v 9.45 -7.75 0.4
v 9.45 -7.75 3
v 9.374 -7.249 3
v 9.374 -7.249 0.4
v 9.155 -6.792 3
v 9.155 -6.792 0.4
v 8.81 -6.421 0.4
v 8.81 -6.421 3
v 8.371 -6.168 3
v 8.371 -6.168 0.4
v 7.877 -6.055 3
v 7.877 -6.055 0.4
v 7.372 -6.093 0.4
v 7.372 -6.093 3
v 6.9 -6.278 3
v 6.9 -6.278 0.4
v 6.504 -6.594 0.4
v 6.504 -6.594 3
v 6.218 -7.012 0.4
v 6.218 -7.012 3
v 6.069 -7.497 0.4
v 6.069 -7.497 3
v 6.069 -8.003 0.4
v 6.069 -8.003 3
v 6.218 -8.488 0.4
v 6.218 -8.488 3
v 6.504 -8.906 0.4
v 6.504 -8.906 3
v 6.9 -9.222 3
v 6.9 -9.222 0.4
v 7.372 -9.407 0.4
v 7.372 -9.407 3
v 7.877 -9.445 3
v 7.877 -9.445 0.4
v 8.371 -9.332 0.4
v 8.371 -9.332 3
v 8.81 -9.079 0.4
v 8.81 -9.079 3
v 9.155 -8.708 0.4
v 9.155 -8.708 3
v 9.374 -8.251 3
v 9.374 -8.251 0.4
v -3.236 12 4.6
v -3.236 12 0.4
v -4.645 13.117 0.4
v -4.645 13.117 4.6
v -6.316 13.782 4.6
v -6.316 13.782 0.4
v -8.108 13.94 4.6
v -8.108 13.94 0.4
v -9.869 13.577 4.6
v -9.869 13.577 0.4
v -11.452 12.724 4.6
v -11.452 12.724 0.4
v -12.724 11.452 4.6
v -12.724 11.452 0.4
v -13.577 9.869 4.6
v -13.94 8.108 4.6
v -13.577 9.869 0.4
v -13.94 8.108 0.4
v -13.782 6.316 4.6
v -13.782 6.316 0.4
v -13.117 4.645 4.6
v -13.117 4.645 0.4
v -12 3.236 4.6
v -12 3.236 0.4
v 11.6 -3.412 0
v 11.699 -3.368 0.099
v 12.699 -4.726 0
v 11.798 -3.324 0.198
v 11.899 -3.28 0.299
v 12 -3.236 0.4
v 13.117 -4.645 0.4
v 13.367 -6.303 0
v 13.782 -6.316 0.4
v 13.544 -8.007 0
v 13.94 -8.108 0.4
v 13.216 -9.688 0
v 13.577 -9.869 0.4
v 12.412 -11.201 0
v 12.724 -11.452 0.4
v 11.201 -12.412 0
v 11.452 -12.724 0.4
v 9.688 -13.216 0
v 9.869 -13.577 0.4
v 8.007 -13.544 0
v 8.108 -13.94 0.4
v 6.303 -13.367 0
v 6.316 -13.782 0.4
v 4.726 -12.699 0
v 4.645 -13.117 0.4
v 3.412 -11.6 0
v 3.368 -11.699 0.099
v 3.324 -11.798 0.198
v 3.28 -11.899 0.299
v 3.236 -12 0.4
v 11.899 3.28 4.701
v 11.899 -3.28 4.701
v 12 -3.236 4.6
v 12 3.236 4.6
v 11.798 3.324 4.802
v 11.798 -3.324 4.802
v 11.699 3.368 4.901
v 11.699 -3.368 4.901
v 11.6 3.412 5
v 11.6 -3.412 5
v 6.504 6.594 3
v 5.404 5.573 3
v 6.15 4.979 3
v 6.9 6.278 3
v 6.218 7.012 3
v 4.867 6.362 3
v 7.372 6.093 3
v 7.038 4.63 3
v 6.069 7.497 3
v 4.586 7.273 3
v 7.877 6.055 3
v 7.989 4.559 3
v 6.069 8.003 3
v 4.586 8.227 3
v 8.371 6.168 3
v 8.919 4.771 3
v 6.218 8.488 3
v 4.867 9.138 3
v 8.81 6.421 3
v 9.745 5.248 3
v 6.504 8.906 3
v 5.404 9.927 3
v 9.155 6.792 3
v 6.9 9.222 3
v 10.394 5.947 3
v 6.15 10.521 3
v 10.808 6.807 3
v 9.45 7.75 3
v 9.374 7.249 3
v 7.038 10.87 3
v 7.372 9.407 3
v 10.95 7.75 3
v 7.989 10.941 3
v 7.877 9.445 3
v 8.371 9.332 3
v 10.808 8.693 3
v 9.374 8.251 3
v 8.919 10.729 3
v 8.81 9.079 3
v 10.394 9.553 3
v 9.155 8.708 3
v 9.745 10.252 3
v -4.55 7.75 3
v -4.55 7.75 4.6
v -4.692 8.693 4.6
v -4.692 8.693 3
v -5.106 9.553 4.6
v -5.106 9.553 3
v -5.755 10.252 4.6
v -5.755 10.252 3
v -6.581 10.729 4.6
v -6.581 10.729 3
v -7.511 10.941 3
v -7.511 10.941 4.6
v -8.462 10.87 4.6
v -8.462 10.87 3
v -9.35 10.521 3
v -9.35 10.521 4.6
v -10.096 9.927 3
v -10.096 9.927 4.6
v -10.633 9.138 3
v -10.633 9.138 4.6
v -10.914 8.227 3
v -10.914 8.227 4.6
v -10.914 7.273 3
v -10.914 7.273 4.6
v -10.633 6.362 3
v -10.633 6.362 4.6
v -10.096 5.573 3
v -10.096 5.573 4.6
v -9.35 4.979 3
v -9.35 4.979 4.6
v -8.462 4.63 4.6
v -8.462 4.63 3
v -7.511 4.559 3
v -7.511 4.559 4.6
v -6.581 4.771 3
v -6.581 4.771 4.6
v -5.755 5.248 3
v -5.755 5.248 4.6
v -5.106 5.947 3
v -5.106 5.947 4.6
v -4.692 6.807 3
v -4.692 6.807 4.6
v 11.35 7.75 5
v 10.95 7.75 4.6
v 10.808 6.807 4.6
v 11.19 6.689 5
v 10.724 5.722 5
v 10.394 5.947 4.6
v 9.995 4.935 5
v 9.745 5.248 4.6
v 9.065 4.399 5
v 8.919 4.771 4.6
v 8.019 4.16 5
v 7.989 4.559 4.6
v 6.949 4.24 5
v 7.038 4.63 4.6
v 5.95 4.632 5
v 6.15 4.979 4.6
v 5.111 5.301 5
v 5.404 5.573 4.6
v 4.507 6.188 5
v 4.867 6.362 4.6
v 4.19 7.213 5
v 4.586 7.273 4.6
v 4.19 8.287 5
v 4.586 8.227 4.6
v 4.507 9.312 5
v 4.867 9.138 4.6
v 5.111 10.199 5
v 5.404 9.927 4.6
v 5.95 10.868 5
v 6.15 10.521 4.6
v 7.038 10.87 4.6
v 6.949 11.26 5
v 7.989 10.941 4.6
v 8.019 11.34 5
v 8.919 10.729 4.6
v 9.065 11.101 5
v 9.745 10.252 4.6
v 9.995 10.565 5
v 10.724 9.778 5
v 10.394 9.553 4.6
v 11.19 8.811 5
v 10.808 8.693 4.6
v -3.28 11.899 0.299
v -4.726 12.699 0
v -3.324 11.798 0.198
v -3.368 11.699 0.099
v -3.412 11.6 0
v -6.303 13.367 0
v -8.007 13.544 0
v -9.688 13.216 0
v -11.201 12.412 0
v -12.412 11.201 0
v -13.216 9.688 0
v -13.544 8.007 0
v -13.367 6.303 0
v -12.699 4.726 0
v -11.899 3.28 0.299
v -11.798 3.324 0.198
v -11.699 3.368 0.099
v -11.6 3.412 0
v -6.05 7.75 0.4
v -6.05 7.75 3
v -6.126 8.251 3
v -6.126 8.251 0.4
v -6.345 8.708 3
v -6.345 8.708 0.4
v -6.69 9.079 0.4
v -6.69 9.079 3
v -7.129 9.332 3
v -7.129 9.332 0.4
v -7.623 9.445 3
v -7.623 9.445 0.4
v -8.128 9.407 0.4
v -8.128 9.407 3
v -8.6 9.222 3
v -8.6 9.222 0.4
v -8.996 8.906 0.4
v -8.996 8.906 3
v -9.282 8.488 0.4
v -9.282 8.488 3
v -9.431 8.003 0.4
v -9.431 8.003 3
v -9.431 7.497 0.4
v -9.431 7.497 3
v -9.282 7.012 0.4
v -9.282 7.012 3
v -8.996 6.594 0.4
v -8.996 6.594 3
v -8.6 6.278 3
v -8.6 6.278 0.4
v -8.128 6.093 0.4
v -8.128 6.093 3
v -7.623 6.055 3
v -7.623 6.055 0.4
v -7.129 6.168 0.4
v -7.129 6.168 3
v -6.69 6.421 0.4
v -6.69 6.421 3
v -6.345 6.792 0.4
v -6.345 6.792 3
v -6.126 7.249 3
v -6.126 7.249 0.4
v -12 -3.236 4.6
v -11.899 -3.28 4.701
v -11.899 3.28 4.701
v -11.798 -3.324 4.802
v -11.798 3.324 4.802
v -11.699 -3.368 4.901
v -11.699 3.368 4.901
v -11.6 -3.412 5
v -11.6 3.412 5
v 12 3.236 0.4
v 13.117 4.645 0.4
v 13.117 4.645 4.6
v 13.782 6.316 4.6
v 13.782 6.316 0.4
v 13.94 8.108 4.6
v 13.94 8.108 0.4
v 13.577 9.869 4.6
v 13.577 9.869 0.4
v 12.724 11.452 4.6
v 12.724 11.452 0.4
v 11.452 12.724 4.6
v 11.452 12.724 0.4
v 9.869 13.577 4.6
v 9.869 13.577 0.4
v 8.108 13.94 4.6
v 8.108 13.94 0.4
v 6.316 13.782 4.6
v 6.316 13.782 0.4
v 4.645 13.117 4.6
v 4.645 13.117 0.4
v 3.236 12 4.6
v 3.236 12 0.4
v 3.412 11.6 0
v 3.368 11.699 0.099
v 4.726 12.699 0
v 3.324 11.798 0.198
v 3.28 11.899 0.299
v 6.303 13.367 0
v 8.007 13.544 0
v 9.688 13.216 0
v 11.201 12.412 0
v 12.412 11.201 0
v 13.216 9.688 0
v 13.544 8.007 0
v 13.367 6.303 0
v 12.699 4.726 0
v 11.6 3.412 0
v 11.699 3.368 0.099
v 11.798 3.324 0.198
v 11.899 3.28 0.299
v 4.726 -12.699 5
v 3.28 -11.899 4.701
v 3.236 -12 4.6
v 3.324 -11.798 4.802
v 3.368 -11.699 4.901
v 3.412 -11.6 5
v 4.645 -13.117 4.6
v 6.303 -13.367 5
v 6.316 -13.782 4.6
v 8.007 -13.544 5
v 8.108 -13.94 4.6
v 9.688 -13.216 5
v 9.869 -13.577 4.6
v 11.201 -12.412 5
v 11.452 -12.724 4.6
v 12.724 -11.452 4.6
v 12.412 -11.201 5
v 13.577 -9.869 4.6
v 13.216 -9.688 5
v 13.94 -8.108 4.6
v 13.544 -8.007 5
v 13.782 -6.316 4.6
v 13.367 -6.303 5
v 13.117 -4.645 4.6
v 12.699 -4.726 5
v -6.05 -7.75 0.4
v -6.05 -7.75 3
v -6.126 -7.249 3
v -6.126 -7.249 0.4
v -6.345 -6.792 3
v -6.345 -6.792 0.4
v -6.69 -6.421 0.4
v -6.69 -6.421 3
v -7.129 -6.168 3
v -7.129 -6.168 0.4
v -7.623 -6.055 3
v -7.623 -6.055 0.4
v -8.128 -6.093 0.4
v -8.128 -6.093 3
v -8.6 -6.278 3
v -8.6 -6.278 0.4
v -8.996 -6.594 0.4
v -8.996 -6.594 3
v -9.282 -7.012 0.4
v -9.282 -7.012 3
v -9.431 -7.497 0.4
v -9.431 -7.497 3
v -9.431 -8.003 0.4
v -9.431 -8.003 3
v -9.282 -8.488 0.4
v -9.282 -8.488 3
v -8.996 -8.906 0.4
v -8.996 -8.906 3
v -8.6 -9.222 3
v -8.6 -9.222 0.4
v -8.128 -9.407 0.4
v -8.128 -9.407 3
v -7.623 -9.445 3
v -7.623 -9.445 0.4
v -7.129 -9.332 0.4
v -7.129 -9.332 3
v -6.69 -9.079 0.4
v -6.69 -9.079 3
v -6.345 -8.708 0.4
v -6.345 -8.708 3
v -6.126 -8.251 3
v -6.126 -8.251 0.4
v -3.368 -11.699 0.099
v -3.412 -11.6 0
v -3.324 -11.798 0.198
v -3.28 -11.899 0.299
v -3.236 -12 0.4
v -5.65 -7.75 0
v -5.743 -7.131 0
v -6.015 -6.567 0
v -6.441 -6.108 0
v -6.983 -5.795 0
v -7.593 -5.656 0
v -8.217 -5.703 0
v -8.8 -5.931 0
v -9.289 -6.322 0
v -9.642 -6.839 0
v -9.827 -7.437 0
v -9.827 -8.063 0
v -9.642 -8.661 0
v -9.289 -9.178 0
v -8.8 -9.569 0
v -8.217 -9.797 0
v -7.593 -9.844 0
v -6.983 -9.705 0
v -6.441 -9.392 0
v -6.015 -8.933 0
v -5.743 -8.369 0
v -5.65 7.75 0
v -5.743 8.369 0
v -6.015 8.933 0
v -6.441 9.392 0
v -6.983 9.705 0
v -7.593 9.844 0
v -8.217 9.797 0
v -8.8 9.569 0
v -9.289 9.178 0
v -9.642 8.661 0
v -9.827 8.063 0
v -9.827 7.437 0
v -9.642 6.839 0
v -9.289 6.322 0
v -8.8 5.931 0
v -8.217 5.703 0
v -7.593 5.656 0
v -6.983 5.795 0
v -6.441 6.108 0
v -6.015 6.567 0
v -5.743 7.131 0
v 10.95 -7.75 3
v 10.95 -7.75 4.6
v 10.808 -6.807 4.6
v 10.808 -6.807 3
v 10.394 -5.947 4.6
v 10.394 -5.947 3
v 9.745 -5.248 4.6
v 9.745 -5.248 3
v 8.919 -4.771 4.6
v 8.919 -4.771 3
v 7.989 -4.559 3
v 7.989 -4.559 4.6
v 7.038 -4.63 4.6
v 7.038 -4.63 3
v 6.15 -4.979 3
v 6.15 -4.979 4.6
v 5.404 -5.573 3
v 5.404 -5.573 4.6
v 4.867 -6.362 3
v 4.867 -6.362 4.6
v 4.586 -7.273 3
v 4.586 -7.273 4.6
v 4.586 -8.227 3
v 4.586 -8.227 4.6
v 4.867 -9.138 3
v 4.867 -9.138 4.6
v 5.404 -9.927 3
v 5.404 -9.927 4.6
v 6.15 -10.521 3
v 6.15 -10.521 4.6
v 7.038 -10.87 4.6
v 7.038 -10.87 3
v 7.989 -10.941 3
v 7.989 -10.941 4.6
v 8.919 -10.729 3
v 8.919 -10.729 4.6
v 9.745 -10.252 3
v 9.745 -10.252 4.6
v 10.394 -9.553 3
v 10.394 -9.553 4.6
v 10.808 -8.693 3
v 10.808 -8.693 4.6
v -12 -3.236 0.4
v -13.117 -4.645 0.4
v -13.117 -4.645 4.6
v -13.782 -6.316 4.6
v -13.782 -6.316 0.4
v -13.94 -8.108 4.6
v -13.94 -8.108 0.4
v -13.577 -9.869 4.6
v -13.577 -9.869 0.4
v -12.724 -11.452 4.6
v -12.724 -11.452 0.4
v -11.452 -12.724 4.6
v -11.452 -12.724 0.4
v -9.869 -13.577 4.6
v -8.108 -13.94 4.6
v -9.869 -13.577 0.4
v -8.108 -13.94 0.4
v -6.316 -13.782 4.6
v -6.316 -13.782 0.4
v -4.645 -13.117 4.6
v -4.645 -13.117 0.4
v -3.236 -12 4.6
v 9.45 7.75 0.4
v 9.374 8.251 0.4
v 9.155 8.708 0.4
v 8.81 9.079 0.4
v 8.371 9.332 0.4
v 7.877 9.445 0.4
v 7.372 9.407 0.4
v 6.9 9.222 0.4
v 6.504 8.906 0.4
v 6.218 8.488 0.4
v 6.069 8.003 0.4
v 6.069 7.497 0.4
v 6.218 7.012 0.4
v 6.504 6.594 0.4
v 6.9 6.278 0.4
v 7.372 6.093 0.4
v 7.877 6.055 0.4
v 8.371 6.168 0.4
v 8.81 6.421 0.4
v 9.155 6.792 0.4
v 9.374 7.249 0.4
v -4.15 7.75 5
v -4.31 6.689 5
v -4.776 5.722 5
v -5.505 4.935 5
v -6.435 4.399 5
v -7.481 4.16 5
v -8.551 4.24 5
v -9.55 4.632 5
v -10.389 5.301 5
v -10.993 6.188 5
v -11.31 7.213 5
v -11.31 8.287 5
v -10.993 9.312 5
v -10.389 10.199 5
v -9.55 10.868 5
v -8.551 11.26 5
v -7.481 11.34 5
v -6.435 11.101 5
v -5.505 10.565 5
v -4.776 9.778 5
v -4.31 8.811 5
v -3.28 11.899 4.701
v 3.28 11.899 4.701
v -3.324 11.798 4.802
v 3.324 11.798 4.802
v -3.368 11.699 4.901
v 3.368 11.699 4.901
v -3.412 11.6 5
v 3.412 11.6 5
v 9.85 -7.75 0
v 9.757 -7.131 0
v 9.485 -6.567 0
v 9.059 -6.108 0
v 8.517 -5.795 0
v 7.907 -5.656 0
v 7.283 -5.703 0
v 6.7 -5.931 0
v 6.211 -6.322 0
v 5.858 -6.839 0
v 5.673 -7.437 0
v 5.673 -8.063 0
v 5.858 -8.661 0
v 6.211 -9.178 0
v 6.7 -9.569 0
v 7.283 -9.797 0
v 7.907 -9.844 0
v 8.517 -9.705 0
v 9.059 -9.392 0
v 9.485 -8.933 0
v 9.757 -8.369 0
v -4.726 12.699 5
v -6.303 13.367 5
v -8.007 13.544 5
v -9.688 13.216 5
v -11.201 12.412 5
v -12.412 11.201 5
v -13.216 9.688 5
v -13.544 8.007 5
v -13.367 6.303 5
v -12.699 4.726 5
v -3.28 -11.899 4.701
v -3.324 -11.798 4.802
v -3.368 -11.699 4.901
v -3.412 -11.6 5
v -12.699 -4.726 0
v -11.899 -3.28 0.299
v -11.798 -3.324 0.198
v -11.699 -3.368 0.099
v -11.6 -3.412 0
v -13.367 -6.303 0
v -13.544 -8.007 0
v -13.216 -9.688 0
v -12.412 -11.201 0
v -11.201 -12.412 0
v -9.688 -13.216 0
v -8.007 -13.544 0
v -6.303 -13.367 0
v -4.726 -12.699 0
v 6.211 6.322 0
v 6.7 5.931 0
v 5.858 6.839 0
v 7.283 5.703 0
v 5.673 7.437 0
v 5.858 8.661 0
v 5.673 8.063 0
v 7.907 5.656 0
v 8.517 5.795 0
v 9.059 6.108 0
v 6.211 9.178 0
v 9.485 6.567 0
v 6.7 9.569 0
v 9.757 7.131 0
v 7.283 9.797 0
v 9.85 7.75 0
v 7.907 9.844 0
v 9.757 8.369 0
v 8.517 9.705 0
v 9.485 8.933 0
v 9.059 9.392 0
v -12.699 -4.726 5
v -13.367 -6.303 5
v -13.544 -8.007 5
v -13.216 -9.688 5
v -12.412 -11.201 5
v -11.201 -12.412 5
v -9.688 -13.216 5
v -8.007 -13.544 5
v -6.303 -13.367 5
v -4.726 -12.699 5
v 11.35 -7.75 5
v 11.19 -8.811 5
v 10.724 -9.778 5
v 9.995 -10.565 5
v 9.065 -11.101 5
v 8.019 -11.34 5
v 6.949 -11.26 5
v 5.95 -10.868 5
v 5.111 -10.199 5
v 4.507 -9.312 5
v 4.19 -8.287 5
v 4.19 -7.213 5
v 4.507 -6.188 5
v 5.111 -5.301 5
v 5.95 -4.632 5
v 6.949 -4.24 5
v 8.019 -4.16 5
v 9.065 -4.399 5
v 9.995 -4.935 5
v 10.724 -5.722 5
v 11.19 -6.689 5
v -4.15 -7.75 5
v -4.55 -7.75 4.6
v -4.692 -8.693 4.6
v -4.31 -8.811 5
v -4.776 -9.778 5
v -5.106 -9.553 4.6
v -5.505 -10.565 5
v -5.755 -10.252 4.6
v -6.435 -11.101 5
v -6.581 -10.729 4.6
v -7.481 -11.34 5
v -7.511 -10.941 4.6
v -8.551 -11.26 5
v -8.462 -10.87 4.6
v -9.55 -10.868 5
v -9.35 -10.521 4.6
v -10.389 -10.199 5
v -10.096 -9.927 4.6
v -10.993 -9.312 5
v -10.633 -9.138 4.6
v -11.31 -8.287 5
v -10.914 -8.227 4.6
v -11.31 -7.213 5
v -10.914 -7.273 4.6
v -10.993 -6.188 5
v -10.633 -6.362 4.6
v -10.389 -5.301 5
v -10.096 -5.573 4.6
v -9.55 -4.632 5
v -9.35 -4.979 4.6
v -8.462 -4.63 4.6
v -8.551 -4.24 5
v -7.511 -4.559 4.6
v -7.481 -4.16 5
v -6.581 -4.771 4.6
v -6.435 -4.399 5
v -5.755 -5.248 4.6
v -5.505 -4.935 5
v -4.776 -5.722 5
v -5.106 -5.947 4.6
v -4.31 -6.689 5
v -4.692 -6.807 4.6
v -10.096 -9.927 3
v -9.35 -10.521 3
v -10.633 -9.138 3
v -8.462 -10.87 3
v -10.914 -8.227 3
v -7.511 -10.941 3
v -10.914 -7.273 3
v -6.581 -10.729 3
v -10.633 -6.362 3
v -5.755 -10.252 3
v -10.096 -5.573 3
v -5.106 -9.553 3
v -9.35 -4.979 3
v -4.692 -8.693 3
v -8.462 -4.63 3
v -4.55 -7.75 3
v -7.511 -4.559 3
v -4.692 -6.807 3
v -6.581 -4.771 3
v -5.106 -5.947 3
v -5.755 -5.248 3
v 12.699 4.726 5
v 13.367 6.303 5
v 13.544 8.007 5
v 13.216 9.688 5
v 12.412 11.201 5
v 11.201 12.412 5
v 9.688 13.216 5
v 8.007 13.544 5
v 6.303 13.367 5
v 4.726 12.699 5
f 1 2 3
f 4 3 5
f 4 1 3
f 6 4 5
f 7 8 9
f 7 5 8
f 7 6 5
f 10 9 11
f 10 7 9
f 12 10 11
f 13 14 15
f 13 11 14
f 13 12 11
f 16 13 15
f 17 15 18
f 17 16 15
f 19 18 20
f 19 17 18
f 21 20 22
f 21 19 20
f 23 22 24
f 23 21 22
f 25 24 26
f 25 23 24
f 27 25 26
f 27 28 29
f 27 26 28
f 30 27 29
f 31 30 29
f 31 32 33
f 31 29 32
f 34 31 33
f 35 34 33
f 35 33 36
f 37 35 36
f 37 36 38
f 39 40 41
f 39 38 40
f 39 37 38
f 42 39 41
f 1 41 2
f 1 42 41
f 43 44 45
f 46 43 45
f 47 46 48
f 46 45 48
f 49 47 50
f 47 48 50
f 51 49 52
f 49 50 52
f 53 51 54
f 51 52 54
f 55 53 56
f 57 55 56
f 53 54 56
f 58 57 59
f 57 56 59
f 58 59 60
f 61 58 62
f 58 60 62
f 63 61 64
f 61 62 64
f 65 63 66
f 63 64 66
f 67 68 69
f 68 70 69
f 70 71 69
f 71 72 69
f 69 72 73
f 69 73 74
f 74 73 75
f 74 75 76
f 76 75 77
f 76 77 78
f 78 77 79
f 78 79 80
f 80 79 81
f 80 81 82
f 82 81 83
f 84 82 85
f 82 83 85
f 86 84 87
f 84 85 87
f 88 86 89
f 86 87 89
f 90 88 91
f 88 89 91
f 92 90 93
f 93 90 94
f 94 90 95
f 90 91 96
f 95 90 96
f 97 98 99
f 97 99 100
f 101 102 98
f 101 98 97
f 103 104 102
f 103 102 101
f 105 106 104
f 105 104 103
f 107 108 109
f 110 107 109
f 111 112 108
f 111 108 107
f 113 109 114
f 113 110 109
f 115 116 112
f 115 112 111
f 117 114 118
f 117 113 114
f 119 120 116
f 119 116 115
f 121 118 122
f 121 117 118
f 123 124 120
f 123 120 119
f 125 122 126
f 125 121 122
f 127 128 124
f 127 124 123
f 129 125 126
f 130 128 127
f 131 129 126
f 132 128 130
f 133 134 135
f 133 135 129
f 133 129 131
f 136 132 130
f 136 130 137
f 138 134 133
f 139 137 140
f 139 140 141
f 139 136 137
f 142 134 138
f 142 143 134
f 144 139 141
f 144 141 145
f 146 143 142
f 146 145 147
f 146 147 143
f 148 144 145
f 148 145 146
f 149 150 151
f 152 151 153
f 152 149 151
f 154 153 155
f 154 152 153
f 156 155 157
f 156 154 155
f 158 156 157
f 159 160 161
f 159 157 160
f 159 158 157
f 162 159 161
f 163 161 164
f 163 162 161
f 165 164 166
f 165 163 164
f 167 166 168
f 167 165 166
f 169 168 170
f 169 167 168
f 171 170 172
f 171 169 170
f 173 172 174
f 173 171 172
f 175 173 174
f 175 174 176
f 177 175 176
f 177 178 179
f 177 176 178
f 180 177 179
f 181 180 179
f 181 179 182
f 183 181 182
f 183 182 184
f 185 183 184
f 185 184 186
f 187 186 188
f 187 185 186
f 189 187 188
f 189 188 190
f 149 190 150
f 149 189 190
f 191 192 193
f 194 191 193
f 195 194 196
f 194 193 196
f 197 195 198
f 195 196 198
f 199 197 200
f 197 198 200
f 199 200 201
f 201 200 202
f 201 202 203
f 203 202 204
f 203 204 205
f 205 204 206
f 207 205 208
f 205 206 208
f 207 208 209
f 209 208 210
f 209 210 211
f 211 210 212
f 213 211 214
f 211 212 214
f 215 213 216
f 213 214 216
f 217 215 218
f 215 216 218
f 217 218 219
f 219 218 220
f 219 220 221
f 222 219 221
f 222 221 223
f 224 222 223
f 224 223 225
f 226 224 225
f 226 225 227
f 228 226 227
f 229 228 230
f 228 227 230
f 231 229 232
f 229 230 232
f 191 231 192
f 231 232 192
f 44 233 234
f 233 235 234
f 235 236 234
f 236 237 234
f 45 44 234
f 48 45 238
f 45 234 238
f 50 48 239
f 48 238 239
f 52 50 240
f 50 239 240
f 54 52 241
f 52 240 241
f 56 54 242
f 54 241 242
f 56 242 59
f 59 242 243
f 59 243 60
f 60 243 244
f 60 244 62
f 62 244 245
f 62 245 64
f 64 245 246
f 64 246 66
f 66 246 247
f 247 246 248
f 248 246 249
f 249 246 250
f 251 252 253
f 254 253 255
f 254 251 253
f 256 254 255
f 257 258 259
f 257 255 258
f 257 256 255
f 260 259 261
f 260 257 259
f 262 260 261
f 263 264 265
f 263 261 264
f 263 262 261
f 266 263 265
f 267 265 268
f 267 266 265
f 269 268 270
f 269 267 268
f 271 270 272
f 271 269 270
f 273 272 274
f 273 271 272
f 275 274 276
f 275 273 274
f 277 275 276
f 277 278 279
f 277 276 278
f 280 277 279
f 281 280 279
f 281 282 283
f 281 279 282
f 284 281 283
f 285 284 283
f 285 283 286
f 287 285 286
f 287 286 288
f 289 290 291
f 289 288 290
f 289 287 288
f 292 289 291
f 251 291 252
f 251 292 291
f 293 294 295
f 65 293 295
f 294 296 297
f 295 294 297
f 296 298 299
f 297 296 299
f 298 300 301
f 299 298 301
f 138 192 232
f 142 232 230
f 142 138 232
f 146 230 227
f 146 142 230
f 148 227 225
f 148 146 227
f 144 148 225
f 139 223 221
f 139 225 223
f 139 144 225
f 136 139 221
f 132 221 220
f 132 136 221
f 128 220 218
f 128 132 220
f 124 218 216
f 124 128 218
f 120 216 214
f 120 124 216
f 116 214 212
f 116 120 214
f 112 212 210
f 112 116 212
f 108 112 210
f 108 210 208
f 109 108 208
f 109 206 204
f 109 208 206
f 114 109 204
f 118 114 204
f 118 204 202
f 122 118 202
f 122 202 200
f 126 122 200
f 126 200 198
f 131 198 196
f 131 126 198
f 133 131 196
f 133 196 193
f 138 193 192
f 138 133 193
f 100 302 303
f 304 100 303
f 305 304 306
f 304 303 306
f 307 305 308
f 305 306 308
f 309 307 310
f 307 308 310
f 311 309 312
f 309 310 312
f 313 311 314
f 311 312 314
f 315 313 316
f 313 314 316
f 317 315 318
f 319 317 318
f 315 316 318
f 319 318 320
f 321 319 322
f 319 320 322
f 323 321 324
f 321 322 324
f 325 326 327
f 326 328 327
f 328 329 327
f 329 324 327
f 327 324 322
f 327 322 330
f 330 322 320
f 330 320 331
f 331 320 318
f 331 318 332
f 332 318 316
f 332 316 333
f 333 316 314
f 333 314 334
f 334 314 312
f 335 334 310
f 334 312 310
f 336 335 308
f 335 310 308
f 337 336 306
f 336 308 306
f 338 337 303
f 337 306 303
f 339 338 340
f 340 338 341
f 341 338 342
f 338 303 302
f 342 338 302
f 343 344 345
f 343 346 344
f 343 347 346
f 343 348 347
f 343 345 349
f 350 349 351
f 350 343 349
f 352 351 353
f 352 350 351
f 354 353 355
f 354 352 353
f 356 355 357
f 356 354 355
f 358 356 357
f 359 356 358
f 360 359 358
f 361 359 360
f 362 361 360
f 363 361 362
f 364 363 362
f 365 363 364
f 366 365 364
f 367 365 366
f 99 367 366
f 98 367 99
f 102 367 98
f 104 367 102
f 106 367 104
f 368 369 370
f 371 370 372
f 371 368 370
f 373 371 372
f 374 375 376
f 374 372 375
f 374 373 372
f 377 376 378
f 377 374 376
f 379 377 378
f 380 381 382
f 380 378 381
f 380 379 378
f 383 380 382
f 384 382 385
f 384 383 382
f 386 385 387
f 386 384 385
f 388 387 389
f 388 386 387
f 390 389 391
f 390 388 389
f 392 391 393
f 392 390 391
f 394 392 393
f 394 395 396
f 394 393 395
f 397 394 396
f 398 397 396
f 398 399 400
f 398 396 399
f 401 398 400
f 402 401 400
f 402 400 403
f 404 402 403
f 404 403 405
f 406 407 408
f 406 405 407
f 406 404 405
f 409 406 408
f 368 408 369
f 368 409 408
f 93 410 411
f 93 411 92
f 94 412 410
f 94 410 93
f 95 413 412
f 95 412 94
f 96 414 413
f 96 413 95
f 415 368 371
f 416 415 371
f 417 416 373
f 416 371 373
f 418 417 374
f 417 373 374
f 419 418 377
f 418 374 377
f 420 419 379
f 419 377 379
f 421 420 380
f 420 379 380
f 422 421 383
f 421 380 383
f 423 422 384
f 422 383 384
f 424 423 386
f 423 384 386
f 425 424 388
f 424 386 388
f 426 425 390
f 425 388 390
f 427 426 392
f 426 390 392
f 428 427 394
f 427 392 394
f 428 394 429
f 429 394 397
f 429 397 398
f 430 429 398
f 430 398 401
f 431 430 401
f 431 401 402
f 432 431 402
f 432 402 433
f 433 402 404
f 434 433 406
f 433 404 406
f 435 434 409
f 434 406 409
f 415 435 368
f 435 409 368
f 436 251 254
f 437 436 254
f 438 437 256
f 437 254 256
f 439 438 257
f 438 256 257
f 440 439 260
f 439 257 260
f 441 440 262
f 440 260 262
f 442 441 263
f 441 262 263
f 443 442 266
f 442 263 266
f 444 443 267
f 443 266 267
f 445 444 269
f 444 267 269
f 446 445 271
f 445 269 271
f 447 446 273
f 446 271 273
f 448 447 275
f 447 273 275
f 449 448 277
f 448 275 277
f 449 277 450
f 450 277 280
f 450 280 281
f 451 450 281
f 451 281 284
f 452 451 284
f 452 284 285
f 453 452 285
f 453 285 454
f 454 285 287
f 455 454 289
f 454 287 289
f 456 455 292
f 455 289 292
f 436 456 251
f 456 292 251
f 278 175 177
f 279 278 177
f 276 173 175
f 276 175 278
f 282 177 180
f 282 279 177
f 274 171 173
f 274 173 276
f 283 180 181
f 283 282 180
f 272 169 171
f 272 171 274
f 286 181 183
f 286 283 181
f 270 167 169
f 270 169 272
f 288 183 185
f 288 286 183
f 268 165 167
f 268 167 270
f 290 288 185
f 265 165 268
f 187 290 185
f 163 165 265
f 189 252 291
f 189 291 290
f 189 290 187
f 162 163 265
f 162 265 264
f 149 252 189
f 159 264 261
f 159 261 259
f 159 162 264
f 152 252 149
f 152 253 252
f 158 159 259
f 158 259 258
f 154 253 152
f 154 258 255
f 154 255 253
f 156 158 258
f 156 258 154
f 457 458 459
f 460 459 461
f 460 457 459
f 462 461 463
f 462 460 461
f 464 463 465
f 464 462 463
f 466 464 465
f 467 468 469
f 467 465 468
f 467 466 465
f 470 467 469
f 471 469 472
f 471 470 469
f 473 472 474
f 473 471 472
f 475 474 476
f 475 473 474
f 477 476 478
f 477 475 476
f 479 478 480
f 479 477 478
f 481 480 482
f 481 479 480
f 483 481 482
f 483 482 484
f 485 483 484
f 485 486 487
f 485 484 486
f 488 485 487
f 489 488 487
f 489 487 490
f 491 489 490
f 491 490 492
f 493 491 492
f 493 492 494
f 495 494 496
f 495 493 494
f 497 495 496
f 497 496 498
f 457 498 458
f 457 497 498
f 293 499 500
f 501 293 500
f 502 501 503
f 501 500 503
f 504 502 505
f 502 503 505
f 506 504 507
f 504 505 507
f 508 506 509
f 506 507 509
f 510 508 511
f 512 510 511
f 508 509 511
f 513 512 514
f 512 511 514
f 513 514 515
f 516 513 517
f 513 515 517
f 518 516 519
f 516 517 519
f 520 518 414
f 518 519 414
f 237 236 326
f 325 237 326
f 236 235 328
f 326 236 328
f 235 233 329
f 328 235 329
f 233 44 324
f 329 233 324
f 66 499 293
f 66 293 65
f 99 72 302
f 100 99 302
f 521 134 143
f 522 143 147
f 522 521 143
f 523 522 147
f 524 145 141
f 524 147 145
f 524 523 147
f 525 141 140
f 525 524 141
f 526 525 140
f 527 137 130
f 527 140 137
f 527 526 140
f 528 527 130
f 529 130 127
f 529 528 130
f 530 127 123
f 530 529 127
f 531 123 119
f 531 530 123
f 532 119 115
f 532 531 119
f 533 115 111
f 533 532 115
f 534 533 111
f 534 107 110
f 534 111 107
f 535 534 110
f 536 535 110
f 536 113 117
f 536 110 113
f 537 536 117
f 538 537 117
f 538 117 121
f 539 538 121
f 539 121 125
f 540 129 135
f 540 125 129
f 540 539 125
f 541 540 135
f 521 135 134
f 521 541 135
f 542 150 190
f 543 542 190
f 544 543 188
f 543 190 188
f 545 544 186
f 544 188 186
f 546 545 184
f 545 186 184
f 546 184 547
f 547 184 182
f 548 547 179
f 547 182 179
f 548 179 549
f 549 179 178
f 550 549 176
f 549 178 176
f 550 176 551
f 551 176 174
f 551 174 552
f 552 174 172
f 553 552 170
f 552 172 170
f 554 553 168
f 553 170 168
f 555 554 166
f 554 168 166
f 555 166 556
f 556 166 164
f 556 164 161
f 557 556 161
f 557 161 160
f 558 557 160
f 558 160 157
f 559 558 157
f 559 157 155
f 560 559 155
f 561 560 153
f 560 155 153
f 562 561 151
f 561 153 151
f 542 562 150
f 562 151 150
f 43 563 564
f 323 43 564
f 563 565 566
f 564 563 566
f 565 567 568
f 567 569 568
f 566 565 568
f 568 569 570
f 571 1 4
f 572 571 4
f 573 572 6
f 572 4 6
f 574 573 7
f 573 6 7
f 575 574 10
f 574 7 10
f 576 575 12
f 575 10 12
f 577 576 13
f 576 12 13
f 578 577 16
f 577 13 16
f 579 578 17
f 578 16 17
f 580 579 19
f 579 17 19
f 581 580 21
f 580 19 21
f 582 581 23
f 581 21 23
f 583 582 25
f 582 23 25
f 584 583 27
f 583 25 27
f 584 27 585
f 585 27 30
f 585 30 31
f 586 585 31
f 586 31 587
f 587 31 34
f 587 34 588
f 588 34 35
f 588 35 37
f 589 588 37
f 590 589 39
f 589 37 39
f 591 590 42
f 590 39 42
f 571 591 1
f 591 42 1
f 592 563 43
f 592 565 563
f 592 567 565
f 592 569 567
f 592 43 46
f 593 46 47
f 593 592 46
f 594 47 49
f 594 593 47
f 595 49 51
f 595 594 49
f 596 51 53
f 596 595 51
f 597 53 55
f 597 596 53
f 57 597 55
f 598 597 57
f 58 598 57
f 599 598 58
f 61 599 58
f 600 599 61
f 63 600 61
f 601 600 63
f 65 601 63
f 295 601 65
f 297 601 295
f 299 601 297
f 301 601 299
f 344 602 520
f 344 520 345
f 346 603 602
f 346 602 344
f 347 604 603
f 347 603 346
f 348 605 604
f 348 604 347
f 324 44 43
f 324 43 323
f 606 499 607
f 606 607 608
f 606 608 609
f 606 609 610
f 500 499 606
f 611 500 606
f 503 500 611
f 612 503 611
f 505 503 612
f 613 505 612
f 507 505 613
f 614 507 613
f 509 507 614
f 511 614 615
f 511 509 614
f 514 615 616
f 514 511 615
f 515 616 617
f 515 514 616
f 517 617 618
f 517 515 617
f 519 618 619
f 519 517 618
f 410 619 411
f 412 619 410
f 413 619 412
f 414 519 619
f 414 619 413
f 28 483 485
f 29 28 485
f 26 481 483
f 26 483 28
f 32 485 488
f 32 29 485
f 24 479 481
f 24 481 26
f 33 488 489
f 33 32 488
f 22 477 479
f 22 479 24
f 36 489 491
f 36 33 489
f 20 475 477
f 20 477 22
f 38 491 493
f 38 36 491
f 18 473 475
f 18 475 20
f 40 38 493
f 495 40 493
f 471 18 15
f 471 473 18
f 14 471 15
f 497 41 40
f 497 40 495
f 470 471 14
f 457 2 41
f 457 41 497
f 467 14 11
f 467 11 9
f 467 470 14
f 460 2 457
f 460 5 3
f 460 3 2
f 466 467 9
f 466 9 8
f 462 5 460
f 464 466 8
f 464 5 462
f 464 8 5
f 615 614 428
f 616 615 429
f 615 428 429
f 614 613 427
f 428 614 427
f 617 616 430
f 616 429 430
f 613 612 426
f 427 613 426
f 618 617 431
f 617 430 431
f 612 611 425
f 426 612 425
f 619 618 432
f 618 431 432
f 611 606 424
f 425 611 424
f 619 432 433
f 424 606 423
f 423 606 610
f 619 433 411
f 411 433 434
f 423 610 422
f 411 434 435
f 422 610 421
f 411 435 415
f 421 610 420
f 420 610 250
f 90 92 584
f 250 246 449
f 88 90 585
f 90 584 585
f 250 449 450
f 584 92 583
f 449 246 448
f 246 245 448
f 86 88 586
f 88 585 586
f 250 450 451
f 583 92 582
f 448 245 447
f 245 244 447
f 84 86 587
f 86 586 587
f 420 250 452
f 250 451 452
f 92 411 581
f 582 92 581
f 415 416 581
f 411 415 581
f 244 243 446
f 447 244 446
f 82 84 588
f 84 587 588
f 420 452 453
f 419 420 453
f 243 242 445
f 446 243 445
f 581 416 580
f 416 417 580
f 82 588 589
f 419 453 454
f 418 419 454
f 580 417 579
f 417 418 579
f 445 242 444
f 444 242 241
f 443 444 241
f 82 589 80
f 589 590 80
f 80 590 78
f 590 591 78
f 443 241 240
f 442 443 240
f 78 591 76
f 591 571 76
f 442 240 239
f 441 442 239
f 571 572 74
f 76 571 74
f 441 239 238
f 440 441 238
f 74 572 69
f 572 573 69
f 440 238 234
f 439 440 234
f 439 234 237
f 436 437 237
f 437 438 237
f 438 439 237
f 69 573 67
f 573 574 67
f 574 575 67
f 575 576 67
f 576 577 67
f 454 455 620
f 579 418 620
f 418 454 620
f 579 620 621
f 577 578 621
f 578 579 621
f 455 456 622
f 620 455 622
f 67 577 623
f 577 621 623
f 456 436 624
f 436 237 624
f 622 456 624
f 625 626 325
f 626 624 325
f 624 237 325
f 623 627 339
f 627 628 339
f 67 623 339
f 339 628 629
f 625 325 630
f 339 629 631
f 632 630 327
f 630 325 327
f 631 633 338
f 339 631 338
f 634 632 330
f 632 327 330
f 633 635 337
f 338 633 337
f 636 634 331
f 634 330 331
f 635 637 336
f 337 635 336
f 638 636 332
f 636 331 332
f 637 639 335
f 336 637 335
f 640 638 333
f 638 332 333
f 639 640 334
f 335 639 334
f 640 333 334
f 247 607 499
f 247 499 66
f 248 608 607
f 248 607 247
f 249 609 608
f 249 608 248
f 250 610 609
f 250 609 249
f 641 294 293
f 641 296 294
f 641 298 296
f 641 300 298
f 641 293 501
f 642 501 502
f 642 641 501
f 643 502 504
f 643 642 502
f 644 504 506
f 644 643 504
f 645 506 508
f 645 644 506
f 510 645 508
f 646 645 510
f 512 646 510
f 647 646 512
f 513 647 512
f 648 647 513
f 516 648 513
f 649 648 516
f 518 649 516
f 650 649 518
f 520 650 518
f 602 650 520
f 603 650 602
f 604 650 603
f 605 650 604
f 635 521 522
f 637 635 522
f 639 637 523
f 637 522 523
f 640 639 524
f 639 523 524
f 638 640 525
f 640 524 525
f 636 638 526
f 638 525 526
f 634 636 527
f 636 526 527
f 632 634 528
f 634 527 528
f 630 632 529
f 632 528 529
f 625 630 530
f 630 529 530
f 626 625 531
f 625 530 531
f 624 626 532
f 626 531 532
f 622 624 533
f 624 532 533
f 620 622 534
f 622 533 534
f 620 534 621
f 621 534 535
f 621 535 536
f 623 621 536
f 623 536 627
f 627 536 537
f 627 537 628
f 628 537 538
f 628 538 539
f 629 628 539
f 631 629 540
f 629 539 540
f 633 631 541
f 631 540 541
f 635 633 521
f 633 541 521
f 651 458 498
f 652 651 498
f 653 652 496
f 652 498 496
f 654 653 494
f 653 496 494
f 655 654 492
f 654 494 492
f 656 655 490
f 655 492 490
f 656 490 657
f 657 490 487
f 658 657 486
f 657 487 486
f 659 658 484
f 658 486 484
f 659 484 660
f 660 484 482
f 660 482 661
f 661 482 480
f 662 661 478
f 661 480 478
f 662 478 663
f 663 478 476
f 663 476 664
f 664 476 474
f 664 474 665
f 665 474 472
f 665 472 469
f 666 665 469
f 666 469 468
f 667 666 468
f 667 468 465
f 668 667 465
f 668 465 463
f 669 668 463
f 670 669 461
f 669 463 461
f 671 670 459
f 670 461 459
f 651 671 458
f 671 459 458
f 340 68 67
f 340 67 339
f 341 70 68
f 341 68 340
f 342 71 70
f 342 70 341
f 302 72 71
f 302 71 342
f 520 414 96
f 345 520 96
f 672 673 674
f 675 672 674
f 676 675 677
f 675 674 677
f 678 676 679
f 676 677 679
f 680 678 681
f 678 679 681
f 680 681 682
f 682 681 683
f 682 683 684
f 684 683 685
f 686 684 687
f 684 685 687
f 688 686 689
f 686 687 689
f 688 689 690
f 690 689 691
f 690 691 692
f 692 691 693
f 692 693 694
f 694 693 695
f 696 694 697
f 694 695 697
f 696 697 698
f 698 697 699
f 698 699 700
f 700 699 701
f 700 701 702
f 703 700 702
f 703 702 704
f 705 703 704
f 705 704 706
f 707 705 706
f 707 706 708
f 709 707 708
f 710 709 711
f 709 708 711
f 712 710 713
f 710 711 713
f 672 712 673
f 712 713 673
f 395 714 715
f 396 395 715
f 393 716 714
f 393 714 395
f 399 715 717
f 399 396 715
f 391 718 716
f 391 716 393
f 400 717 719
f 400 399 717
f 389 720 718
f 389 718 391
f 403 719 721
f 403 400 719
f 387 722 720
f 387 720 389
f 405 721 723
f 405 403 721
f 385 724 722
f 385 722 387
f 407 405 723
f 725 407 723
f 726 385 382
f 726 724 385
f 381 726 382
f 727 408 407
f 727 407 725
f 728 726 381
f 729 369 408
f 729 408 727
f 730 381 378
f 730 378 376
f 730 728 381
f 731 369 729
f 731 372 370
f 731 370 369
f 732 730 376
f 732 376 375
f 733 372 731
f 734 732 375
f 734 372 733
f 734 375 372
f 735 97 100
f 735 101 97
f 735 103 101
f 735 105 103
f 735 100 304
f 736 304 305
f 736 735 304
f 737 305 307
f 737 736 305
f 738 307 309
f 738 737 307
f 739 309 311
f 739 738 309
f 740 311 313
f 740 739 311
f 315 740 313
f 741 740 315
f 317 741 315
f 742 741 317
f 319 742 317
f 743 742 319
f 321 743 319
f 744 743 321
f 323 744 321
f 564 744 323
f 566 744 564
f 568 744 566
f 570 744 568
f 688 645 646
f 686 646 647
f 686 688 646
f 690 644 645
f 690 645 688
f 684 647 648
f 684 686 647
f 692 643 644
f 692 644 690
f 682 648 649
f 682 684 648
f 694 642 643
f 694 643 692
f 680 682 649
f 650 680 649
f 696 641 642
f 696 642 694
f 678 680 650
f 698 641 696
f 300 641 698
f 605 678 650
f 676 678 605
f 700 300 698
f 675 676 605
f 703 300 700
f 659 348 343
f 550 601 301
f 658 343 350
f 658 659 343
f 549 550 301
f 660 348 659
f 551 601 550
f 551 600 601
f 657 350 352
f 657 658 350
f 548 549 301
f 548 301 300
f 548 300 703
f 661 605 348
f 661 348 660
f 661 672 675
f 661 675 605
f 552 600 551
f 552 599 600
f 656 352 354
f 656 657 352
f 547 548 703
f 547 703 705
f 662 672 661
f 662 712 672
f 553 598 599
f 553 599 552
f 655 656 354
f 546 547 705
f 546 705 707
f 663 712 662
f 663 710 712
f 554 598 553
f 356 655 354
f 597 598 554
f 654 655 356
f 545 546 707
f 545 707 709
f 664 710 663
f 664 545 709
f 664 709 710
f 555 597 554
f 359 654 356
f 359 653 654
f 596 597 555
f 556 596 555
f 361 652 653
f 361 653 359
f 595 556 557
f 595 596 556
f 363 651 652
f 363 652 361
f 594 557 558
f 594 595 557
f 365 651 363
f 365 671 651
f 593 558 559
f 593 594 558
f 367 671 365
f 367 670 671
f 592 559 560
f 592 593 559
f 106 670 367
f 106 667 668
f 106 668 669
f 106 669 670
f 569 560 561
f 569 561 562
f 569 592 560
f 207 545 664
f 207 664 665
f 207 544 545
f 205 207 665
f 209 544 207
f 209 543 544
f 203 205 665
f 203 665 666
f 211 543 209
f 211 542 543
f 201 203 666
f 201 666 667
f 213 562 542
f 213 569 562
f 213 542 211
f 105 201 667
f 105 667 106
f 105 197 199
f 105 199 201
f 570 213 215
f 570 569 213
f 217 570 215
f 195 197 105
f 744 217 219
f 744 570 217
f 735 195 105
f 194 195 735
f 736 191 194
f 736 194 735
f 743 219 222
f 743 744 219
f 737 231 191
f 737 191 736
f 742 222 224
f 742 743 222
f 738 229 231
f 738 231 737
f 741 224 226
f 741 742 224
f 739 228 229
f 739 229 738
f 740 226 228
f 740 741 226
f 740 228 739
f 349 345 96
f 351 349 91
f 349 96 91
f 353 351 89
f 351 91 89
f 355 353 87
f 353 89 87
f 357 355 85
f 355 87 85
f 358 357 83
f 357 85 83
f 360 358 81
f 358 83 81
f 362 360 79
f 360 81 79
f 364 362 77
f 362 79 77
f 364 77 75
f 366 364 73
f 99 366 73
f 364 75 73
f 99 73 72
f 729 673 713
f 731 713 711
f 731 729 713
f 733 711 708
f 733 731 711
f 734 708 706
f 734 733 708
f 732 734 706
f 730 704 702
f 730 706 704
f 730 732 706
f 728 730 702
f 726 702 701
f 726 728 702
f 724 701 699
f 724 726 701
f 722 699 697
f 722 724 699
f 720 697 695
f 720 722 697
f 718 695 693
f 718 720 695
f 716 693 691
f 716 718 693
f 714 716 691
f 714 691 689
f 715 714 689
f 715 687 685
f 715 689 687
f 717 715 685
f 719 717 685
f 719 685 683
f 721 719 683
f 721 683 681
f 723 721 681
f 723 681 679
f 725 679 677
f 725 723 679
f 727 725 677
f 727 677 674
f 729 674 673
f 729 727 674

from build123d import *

# Parameters (mm, degrees)
CYLINDER001_R     = 1.7
CYLINDER001_DEPTH = 10
CYLINDER002_R     = 1.7
CYLINDER002_DEPTH = 10
CYLINDER003_R     = 1.7
CYLINDER003_DEPTH = 10
CYLINDER_R        = 1.7
CYLINDER_DEPTH    = 10
CYLINDER010_R     = 3.2
CYLINDER010_DEPTH = 10
CYLINDER009_R     = 3.2
CYLINDER009_DEPTH = 10
CYLINDER008_R     = 3.2
CYLINDER008_DEPTH = 10
CYLINDER011_R     = 3.2
CYLINDER011_DEPTH = 10
CYLINDER005_R     = 6.2
CYLINDER005_DEPTH = 5
CYLINDER006_R     = 6.2
CYLINDER006_DEPTH = 5
CYLINDER007_R     = 6.2
CYLINDER007_DEPTH = 5
BOX_W             = 24
BOX_H             = 24
BOX_DEPTH         = 5
CYLINDER004_R     = 6.2
CYLINDER004_DEPTH = 5
CHAMFER_SIZE      = 0.4
CHAMFER001_SIZE   = 0.4


with BuildPart() as cylinder001:
    # Cylinder001 → Cylinder001 (new body)
    with BuildSketch(Plane(origin=(-7.75, 7.75, 0), x_dir=(1, 0, 0), z_dir=(0, 0, 1))):
        Circle(CYLINDER001_R)
    extrude(amount=CYLINDER001_DEPTH)


with BuildPart() as cylinder002:
    # Cylinder002 → Cylinder002 (new body)
    with BuildSketch(Plane(origin=(7.75, -7.75, 0), x_dir=(1, 0, 0), z_dir=(0, 0, 1))):
        Circle(CYLINDER002_R)
    extrude(amount=CYLINDER002_DEPTH)


with BuildPart() as cylinder003:
    # Cylinder003 → Cylinder003 (new body)
    with BuildSketch(Plane(origin=(-7.75, -7.75, 0), x_dir=(1, 0, 0), z_dir=(0, 0, 1))):
        Circle(CYLINDER003_R)
    extrude(amount=CYLINDER003_DEPTH)


with BuildPart() as fusion002:
    # Cylinder → Cylinder (new body)
    with BuildSketch(Plane(origin=(7.75, 7.75, 0), x_dir=(1, 0, 0), z_dir=(0, 0, 1))):
        Circle(CYLINDER_R)
    extrude(amount=CYLINDER_DEPTH)

    # Fusion002: union Cylinder001, Cylinder002, Cylinder003
    add(cylinder001.part)
    add(cylinder002.part)
    add(cylinder003.part)


with BuildPart() as cylinder010:
    # Cylinder010 → Cylinder010 (new body)
    with BuildSketch(Plane(origin=(-7.75, 7.75, 0), x_dir=(1, 0, 0), z_dir=(0, 0, 1))):
        Circle(CYLINDER010_R)
    extrude(amount=CYLINDER010_DEPTH)


with BuildPart() as cylinder009:
    # Cylinder009 → Cylinder009 (new body)
    with BuildSketch(Plane(origin=(7.75, 7.75, 0), x_dir=(1, 0, 0), z_dir=(0, 0, 1))):
        Circle(CYLINDER009_R)
    extrude(amount=CYLINDER009_DEPTH)


with BuildPart() as cylinder008:
    # Cylinder008 → Cylinder008 (new body)
    with BuildSketch(Plane(origin=(-7.75, -7.75, 0), x_dir=(1, 0, 0), z_dir=(0, 0, 1))):
        Circle(CYLINDER008_R)
    extrude(amount=CYLINDER008_DEPTH)


with BuildPart() as fusion:
    # Cylinder011 → Cylinder011 (new body)
    with BuildSketch(Plane(origin=(7.75, -7.75, 0), x_dir=(1, 0, 0), z_dir=(0, 0, 1))):
        Circle(CYLINDER011_R)
    extrude(amount=CYLINDER011_DEPTH)

    # Fusion: union Cylinder010, Cylinder009, Cylinder008
    add(cylinder010.part)
    add(cylinder009.part)
    add(cylinder008.part)


with BuildPart() as fusion_1:
    # Fusion placement: moved
    add(fusion.part.moved(Location((0, 0, 3))))


with BuildPart() as cylinder005:
    # Cylinder005 → Cylinder005 (new body)
    with BuildSketch(Plane(origin=(7.75, -7.75, 0), x_dir=(1, 0, 0), z_dir=(0, 0, 1))):
        Circle(CYLINDER005_R)
    extrude(amount=CYLINDER005_DEPTH)


with BuildPart() as cylinder006:
    # Cylinder006 → Cylinder006 (new body)
    with BuildSketch(Plane(origin=(-7.75, 7.75, 0), x_dir=(1, 0, 0), z_dir=(0, 0, 1))):
        Circle(CYLINDER006_R)
    extrude(amount=CYLINDER006_DEPTH)


with BuildPart() as cylinder007:
    # Cylinder007 → Cylinder007 (new body)
    with BuildSketch(Plane(origin=(7.75, 7.75, 0), x_dir=(1, 0, 0), z_dir=(0, 0, 1))):
        Circle(CYLINDER007_R)
    extrude(amount=CYLINDER007_DEPTH)


with BuildPart() as cube:
    # Box → Box (new body)
    with BuildSketch(Plane(origin=(-12, -12, 0), x_dir=(1, 0, 0), z_dir=(0, 0, 1))):
        with Locations((12, 12)):
            Rectangle(BOX_W, BOX_H)
    extrude(amount=BOX_DEPTH)


with BuildPart() as chamfer001001:
    # Cylinder004 → Cylinder004 (new body)
    with BuildSketch(Plane(origin=(-7.75, -7.75, 0), x_dir=(1, 0, 0), z_dir=(0, 0, 1))):
        Circle(CYLINDER004_R)
    extrude(amount=CYLINDER004_DEPTH)

    # Fusion001: union Cylinder005, Cylinder006, Cylinder007, Cube
    add(cylinder005.part)
    add(cylinder006.part)
    add(cylinder007.part)
    add(cube.part)

    # Cut: cut Fusion
    add(fusion_1.part, mode=Mode.SUBTRACT)

    # Cut001: cut Fusion002
    add(fusion002.part, mode=Mode.SUBTRACT)

    # Chamfer
    chamfer_edges = [chamfer001001.edges().sort_by_distance(p)[0] for p in [
        (0, -12, 5),
        (-12.134062, -12.134062, 5),
        (-12, 0, 5),
        (-12.134062, 12.134062, 5),
        (0, 12, 5),
        (12, 0, 5),
        (-10.95, -7.75, 5),
        (4.55, -7.75, 5),
        (-10.95, 7.75, 5),
        (4.55, 7.75, 5),
        (10.036078, -13.513146, 5),
        (13.441661, -5.291342, 5),
        (13.441661, 5.291342, 5),
        (10.036078, 13.513146, 5),
    ]]
    chamfer(chamfer_edges, length=CHAMFER_SIZE)

    # Chamfer001
    chamfer001_edges = [chamfer001001.edges().sort_by_distance(p)[0] for p in [
        (0, -12, 0),
        (10.036078, -13.513146, 0),
        (13.441661, -5.291342, 0),
        (-12, 0, 0),
        (-12.134062, 12.134062, 0),
        (0, 12, 0),
        (10.036078, 13.513146, 0),
        (13.441661, 5.291342, 0),
        (12, 0, 0),
        (-12.134062, -12.134062, 0),
        (-9.45, -7.75, 0),
        (6.05, -7.75, 0),
        (-9.45, 7.75, 0),
        (6.05, 7.75, 0),
    ]]
    chamfer(chamfer001_edges, length=CHAMFER001_SIZE)


solid = chamfer001001.part
